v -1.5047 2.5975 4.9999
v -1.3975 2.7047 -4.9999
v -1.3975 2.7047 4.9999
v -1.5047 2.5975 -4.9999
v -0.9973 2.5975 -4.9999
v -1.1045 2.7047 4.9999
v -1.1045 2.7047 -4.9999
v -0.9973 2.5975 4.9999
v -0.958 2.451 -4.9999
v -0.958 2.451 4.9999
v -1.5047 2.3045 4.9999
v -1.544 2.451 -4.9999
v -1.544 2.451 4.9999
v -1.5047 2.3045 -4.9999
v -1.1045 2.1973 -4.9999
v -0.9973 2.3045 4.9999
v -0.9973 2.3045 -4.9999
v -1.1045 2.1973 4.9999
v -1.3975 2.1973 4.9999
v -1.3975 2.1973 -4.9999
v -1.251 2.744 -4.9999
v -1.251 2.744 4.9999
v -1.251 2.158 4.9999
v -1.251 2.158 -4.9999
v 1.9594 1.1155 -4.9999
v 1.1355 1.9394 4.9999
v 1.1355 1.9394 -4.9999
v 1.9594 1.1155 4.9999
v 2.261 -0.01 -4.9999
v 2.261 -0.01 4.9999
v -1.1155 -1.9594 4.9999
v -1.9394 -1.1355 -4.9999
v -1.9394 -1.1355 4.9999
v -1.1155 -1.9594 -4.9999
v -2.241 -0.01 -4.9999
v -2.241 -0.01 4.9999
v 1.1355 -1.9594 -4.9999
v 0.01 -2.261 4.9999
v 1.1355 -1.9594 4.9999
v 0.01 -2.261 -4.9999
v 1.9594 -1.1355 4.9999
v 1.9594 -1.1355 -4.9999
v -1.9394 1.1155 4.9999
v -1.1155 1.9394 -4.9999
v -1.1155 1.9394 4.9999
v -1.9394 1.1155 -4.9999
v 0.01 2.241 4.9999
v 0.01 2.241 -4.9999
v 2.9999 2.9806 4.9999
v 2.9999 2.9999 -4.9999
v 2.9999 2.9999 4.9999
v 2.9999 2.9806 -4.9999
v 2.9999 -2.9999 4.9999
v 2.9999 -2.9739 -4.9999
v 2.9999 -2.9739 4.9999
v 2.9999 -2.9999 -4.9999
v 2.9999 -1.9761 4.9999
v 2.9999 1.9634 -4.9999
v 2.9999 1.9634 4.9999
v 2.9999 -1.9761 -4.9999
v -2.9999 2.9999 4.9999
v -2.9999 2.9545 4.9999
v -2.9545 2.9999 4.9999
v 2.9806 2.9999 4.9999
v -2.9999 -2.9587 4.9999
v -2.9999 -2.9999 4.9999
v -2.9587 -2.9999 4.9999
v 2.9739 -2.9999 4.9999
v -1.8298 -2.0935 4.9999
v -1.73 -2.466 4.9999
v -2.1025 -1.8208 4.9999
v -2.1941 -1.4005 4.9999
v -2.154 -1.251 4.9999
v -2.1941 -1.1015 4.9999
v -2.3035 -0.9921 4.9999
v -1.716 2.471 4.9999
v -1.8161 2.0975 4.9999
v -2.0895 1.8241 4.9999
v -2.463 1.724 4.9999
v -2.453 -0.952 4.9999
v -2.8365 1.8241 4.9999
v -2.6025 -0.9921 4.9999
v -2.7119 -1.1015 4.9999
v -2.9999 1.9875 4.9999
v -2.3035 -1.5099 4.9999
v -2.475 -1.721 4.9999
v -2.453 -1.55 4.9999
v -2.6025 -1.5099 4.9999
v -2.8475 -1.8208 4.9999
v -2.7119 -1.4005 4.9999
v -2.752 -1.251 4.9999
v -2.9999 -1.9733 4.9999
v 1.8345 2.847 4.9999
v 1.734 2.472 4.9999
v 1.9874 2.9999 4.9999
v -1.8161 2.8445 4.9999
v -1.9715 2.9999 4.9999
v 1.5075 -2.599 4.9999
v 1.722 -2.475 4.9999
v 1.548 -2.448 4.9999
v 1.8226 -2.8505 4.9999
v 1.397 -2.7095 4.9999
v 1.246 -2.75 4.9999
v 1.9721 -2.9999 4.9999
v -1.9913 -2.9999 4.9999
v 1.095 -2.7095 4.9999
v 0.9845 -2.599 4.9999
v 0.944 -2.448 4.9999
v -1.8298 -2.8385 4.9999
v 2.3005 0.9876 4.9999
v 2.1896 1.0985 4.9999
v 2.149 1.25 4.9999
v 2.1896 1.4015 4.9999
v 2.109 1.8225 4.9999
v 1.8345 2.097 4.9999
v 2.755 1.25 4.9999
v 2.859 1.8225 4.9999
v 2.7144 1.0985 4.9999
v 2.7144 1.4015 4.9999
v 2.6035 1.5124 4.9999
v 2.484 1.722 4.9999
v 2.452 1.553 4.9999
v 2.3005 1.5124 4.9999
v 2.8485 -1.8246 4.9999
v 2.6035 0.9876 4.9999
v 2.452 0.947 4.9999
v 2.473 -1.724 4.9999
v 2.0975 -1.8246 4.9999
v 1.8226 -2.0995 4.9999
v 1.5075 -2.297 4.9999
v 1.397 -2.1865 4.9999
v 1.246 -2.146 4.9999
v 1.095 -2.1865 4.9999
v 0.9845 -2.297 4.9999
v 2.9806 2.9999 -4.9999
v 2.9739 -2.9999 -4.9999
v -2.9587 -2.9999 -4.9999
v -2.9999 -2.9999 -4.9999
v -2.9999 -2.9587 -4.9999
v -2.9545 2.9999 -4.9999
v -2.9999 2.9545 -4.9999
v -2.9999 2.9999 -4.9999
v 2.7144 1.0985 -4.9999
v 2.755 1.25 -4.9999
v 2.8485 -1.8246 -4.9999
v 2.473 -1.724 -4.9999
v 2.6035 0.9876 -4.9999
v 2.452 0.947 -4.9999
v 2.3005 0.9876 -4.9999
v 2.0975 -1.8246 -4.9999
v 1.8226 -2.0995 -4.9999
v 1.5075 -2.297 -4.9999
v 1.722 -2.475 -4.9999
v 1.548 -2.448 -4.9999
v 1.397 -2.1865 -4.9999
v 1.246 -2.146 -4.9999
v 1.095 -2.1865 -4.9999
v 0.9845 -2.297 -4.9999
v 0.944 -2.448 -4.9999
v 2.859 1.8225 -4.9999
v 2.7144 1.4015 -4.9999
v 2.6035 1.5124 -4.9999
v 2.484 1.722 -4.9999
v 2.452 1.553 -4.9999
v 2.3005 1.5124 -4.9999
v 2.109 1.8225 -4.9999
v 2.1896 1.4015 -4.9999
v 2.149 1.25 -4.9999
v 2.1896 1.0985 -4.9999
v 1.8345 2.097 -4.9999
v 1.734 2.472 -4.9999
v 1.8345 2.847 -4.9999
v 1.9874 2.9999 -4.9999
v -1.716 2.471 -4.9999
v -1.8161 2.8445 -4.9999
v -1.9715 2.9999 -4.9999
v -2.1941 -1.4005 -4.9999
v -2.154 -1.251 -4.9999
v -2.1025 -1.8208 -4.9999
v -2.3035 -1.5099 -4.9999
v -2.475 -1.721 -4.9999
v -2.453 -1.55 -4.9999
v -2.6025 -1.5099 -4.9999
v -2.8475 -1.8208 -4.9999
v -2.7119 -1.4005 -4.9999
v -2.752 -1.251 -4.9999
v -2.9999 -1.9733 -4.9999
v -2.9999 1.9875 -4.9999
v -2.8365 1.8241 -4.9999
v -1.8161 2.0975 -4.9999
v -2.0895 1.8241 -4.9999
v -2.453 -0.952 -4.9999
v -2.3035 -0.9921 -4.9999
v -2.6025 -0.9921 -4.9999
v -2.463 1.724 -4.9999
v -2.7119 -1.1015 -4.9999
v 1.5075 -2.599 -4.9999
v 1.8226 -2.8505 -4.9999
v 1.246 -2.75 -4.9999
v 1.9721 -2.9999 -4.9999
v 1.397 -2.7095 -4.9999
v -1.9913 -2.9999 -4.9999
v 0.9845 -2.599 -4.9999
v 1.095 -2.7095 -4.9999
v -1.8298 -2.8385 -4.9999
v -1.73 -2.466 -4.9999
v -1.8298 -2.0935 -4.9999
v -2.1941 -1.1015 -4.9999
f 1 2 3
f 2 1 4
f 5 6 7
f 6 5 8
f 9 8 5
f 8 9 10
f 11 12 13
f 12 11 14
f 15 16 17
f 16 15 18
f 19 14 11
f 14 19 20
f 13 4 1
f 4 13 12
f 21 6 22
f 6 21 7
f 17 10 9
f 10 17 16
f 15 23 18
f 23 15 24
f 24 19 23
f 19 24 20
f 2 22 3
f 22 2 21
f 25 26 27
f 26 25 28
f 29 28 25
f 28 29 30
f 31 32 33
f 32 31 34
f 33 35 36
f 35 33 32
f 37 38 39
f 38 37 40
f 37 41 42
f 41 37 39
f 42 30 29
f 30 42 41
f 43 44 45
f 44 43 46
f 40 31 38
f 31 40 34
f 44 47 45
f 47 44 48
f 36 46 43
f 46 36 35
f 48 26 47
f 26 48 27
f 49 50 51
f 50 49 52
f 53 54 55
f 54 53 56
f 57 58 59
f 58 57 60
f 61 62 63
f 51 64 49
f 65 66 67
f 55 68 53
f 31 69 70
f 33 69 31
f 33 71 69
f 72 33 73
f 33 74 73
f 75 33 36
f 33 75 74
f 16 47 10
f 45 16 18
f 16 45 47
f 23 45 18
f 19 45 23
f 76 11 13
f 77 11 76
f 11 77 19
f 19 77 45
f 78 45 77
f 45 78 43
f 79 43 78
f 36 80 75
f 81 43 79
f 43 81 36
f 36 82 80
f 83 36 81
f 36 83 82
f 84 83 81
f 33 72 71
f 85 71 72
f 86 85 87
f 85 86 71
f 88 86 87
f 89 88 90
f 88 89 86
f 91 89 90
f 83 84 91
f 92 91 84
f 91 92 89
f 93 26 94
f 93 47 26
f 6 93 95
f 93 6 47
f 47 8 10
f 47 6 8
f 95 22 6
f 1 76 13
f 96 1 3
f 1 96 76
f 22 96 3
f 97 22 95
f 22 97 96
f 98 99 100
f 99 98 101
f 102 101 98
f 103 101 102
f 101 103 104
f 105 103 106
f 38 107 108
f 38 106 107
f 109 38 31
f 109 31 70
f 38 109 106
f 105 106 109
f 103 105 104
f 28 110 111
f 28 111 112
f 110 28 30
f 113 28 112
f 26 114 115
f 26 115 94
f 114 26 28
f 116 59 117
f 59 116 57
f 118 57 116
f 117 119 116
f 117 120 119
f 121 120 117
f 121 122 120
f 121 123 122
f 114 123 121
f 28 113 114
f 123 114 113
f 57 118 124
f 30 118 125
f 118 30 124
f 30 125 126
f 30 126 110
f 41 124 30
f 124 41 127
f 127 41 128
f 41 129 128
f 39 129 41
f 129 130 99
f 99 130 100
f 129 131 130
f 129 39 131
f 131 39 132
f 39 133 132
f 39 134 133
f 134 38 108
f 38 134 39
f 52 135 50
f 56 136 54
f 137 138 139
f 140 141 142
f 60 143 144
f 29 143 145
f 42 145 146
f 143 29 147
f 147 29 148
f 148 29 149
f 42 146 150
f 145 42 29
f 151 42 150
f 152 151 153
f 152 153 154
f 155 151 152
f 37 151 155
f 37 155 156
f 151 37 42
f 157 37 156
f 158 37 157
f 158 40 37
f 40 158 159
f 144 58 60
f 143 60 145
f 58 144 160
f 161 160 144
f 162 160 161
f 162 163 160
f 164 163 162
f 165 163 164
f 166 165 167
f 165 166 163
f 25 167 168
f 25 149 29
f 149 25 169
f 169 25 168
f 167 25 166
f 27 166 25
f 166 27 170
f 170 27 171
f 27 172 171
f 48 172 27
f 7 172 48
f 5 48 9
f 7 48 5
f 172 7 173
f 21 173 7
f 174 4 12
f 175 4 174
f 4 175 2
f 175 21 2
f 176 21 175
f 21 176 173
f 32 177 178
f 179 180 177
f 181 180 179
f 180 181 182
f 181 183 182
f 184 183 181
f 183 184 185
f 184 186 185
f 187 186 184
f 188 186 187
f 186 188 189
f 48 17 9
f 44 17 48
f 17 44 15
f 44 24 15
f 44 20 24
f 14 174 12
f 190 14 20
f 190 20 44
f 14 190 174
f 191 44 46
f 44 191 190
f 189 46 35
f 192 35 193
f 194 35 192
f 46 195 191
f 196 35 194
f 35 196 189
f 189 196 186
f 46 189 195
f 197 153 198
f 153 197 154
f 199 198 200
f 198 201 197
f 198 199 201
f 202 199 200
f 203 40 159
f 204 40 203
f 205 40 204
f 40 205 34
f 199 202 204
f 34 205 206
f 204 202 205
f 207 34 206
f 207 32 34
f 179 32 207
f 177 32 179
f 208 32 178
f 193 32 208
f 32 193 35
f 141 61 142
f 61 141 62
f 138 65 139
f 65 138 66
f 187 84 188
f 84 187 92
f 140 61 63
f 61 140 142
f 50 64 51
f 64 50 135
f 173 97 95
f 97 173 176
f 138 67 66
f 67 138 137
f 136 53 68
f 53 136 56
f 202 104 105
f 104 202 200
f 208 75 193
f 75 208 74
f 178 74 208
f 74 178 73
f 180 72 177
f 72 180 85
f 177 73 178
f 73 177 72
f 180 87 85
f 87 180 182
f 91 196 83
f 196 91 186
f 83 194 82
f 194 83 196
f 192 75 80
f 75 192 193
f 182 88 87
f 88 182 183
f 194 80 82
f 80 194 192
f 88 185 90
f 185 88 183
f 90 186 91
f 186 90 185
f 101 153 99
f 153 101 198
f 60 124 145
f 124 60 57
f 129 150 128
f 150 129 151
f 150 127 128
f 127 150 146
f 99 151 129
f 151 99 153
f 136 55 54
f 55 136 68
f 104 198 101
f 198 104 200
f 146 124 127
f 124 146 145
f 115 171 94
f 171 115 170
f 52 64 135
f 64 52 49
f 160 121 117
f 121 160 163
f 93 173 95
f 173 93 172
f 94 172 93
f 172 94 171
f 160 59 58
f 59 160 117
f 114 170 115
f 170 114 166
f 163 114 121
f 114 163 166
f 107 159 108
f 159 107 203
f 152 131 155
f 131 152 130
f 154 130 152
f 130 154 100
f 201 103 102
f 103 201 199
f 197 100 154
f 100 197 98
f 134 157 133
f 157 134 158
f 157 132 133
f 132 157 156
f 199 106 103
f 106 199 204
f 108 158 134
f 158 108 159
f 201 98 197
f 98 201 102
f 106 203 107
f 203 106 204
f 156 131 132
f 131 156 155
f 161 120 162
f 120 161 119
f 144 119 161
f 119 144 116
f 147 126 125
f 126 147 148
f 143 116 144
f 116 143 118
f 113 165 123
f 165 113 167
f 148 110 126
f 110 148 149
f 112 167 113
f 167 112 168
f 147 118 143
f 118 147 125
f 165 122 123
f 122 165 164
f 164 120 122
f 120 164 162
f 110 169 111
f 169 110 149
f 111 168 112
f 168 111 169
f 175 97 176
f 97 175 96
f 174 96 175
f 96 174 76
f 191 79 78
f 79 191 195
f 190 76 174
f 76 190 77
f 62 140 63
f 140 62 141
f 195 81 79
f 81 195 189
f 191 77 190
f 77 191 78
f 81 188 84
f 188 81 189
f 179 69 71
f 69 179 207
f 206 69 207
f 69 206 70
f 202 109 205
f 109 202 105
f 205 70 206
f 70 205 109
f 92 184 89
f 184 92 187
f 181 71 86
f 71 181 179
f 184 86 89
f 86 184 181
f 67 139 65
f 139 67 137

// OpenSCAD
intersection() {
  cube(size = [7.1999, 7.1999, 11.9999], center = true);

  union() {
    intersection() {
      translate([0, 7.625, 0])
      cube(size = [5.9999, 21.2499, 9.9999], center = true);
    
      translate([2.484, 2.472, -11.625])
      cylinder(h = 13.2499, r1 = 0.75, r2 = 0.75, center = true, $fn = 12);
    }
  
    intersection() {
      difference() {
        cube(size = [5.9999, 5.9999, 9.9999], center = true);
      
        union() {
          translate([-1.251, 2.451, 6.625])
          cylinder(h = 23.25, r1 = 0.293, r2 = 0.293, center = true, $fn = 12);
        
          translate([0.01, -0.01, 0])
          cylinder(h = 36.5, r1 = 2.251, r2 = 2.251, center = true, $fn = 12);
        }
      }
    
      difference() {
        difference() {
          difference() {
            sphere(r = 54.7499, $fn = 109);
          
            translate([-2.453, -1.251, -6.625])
            cylinder(h = 23.25, r1 = 0.299, r2 = 0.299, center = true, $fn = 12);
          }
        
          union() {
            translate([2.473, -2.475, 0])
            cylinder(h = 36.5, r1 = 0.751, r2 = 0.751, center = true, $fn = 12);
          
            translate([2.484, 2.472, -6.625])
            cylinder(h = 23.25, r1 = 0.75, r2 = 0.75, center = true, $fn = 12);
          }
        }
      
        union() {
          translate([1.246, -2.448, -6.625])
          cylinder(h = 23.25, r1 = 0.302, r2 = 0.302, center = true, $fn = 12);
        
          translate([2.452, 1.25, -6.625])
          cylinder(h = 23.25, r1 = 0.303, r2 = 0.303, center = true, $fn = 12);
        
          translate([-2.463, 2.471, 0])
          cylinder(h = 10, r1 = 0.747, r2 = 0.747, center = true, $fn = 12);
        
          translate([-2.475, -2.466, 6.625])
          cylinder(h = 23.25, r1 = 0.745, r2 = 0.745, center = true, $fn = 12);
        }
      }
    }
  }
}
